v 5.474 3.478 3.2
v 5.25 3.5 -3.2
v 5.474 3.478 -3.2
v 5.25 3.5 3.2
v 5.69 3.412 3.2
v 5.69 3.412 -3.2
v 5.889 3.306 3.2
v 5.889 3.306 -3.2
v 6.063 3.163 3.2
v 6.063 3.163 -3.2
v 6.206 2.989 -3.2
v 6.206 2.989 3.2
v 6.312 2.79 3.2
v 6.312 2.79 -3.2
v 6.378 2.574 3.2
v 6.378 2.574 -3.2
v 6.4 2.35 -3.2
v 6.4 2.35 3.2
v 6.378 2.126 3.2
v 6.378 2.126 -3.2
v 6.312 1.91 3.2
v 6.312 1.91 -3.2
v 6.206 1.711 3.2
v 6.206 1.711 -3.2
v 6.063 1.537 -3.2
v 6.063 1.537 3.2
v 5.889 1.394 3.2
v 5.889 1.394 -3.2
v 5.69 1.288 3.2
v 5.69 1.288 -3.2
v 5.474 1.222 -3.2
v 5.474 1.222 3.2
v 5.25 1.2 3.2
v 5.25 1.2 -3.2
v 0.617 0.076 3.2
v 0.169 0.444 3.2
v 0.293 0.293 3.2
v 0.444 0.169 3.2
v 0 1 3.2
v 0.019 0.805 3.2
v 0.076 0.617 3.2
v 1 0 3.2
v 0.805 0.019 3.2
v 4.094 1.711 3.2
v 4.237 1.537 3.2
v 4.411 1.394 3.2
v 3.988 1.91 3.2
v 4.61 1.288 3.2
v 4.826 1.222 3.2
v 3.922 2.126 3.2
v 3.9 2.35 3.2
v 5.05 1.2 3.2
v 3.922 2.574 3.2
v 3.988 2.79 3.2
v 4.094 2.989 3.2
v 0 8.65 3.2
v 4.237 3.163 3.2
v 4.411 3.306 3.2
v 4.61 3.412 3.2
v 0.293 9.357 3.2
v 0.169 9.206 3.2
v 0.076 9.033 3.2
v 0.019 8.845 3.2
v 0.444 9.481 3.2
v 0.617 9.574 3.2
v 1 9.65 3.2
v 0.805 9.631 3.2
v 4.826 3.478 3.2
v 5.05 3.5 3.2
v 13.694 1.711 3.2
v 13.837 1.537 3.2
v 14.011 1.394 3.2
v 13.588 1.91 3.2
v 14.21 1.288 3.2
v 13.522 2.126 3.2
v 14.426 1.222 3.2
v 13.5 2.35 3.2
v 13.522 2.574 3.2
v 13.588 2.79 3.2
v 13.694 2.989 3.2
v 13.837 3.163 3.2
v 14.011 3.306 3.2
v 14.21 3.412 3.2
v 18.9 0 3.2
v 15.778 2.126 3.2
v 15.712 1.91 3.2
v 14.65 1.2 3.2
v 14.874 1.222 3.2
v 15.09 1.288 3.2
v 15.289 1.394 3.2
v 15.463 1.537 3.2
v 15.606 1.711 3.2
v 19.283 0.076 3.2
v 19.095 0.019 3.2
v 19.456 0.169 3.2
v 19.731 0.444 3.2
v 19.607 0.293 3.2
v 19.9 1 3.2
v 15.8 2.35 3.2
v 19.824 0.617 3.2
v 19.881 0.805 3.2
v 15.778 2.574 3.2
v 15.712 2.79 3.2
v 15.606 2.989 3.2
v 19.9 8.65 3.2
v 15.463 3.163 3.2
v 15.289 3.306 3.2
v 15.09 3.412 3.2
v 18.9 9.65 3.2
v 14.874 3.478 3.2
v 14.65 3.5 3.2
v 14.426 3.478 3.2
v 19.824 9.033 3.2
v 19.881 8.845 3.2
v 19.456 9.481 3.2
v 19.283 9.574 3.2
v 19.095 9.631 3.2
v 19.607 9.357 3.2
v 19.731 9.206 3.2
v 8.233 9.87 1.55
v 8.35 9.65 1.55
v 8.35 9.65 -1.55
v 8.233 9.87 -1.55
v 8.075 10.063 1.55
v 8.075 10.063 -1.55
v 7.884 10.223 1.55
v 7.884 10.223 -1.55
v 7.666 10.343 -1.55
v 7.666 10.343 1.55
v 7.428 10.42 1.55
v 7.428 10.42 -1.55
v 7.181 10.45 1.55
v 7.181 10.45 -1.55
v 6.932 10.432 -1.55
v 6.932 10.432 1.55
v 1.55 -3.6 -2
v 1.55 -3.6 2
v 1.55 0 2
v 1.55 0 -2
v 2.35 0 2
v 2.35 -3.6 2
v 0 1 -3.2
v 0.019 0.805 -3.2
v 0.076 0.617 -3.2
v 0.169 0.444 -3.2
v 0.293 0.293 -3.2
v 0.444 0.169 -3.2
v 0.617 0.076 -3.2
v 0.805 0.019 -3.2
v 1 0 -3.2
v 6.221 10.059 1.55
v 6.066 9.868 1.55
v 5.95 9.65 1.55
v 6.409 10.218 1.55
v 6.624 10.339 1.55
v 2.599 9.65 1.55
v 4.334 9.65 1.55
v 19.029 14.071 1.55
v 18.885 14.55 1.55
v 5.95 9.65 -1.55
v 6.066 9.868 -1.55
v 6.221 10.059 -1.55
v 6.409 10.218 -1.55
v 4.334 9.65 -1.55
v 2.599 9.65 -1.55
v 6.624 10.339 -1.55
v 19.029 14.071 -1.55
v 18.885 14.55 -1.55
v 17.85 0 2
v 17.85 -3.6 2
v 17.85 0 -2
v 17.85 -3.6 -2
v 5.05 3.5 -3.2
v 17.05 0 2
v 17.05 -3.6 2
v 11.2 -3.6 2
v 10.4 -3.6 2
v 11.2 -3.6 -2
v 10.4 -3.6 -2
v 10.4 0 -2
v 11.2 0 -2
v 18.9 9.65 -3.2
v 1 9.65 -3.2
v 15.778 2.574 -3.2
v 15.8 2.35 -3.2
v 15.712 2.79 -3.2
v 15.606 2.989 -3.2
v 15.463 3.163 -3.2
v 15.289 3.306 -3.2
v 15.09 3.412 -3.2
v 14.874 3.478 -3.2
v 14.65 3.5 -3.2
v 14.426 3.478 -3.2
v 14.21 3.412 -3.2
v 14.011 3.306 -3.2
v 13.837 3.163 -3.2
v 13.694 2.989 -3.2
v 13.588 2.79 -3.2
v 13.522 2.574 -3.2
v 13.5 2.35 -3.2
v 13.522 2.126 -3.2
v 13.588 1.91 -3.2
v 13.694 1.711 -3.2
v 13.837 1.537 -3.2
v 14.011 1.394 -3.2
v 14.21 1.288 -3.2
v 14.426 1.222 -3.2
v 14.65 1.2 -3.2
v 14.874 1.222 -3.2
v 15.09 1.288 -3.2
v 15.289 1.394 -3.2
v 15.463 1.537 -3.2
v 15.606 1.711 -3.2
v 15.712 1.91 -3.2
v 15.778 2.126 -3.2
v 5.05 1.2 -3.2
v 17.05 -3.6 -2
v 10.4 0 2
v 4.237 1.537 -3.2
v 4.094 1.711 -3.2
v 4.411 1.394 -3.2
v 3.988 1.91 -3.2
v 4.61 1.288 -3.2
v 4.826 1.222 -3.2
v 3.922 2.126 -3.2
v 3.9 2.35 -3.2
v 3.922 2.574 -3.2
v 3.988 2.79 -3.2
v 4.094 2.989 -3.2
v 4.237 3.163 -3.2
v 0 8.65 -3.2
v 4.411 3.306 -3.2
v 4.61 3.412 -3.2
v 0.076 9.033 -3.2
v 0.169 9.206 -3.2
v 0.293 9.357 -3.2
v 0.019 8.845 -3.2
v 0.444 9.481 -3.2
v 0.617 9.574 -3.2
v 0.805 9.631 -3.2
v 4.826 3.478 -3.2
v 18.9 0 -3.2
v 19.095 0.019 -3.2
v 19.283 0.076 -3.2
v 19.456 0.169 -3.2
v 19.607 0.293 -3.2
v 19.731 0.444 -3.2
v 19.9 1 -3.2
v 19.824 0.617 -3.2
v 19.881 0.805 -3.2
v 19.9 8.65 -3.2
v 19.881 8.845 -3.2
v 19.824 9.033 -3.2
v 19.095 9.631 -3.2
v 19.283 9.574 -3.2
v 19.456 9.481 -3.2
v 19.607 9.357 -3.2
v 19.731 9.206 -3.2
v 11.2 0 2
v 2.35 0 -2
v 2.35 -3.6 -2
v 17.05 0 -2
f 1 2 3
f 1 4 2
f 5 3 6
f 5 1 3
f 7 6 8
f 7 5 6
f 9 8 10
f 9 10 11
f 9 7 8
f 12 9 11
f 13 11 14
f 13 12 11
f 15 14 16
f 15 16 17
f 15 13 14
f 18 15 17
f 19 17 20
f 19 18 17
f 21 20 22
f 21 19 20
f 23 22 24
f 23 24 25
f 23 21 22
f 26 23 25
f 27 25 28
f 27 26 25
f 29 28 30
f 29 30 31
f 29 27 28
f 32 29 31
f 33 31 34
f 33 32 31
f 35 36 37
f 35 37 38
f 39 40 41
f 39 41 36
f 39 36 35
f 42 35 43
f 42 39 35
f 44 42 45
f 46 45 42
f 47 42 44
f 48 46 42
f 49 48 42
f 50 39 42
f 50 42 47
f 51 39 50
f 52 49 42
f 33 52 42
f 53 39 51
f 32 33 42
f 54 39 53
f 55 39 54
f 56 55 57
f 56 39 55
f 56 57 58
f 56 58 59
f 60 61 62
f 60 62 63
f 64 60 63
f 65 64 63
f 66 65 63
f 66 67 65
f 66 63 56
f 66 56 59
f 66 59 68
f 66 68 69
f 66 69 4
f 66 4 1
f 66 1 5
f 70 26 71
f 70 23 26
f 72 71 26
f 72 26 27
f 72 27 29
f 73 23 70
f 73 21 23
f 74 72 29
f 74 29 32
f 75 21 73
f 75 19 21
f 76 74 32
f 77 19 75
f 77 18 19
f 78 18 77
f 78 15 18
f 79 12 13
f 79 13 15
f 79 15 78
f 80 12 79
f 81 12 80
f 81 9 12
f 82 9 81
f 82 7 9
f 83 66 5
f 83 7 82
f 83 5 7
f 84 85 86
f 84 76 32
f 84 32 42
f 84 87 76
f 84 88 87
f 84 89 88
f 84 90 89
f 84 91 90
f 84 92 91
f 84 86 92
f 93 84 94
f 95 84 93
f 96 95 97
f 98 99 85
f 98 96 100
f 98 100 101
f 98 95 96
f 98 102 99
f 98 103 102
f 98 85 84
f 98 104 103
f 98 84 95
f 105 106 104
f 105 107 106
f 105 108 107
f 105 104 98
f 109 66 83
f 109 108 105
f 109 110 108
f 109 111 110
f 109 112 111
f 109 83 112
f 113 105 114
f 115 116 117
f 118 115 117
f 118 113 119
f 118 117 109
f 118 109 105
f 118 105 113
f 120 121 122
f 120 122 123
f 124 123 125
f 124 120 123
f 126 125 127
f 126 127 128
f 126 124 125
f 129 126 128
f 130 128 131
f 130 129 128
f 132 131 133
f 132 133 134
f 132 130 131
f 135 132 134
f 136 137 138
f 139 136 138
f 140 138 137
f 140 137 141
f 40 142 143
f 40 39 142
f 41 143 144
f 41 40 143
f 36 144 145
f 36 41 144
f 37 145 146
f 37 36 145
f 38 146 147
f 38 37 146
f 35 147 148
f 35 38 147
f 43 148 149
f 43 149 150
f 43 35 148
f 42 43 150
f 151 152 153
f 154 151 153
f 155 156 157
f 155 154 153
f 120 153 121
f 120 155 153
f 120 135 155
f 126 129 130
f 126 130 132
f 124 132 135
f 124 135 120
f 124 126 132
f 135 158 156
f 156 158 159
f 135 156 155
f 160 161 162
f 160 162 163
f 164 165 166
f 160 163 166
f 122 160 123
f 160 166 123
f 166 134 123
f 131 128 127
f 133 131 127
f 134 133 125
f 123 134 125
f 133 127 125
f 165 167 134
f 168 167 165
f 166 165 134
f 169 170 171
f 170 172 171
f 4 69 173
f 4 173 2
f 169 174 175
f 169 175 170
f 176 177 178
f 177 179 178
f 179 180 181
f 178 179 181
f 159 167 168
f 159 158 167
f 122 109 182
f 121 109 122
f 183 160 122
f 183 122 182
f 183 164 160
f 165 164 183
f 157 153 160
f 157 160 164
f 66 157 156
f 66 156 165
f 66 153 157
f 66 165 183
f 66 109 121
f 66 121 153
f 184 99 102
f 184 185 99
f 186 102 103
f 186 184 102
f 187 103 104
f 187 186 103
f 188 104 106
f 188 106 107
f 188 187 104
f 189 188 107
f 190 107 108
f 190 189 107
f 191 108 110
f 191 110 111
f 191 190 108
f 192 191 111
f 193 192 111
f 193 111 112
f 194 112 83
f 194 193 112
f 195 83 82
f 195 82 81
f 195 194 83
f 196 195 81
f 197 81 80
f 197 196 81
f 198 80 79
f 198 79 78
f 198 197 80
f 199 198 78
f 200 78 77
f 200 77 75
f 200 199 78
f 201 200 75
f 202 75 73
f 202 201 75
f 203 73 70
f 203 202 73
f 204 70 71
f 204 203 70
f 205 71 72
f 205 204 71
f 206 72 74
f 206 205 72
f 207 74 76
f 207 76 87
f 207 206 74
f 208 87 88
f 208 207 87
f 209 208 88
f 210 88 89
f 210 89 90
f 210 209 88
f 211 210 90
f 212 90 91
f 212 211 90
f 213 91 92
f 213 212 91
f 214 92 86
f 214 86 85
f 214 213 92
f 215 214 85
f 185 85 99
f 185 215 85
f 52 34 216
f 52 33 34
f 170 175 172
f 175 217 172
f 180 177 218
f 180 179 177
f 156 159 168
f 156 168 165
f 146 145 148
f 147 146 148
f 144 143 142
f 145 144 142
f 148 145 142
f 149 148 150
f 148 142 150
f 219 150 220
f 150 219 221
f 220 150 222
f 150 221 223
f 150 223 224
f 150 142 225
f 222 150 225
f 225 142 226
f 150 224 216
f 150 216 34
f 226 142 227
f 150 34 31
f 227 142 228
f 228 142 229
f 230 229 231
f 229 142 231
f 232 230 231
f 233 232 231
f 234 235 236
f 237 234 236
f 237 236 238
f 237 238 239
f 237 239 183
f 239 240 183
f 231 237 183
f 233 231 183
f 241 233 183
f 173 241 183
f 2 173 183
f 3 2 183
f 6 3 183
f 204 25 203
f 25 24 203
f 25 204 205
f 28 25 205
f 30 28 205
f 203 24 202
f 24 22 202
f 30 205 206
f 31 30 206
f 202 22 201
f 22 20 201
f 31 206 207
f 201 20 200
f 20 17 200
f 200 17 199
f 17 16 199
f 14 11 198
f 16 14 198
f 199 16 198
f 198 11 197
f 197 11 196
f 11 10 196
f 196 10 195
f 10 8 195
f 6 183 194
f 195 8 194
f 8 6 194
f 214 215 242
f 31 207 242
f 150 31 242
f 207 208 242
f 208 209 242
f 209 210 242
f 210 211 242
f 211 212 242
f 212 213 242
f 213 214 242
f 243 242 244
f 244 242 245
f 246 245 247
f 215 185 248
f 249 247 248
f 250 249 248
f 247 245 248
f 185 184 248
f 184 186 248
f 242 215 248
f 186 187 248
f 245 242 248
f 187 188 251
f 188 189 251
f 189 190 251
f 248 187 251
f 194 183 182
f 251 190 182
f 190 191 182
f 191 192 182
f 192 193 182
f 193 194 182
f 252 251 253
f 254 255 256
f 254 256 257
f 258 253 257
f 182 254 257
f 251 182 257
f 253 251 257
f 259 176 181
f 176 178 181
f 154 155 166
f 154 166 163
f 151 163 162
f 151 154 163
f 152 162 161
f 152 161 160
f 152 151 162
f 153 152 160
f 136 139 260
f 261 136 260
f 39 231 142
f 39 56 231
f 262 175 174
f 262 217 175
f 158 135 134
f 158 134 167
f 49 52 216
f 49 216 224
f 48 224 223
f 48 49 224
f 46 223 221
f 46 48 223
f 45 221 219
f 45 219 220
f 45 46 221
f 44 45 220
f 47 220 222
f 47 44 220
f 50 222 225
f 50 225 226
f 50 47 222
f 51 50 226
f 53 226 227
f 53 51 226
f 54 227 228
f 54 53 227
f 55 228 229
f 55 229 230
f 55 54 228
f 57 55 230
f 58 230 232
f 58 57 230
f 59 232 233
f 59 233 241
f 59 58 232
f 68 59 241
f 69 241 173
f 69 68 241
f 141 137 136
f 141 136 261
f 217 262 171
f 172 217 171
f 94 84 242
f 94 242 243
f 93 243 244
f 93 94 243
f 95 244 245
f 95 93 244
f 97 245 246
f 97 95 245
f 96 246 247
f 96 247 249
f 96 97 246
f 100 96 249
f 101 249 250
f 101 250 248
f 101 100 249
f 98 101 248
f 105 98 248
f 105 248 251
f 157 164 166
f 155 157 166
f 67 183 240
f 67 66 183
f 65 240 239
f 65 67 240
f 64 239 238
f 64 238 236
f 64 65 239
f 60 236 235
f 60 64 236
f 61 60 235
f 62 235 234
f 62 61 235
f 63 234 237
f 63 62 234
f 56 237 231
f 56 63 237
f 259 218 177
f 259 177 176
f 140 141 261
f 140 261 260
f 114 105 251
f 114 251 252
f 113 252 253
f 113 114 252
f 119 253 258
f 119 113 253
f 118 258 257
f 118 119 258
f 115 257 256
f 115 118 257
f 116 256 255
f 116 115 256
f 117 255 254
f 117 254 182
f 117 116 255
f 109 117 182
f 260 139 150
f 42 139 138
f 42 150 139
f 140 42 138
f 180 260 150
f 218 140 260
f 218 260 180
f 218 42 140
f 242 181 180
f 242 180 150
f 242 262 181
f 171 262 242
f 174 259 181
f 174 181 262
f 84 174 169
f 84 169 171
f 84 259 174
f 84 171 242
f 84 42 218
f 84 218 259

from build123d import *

# Parameters (mm, degrees)
F0_R     = 1.15
F1_DEPTH = 3.2
F3_DEPTH = 1.55
F4_W     = 0.8
F4_H     = 3.6
F5_DEPTH = 2
F7_DEPTH = 1.55


with BuildPart() as f1:
    # F0 (on Top) → F1 (new body, symmetric)
    with BuildSketch(Plane.XY):
        with BuildLine():
            ThreePointArc((0, 1), (0.292893, 0.292893), (1, 0))
            Line((1, 0), (18.9, 0))
            ThreePointArc((18.9, 0), (19.607107, 0.292893), (19.9, 1))
            Line((19.9, 1), (19.9, 8.65))
            ThreePointArc((19.9, 8.65), (19.607107, 9.357107), (18.9, 9.65))
            Line((18.9, 9.65), (1, 9.65))
            ThreePointArc((1, 9.65), (0.292893, 9.357107), (0, 8.65))
            Line((0, 8.65), (0, 1))
        make_face()
        with BuildLine():
            ThreePointArc((5.05, 1.2), (3.9, 2.35), (5.05, 3.5))
            Line((5.05, 3.5), (5.25, 3.5))
            ThreePointArc((5.25, 3.5), (6.4, 2.35), (5.25, 1.2))
            Line((5.25, 1.2), (5.05, 1.2))
        make_face(mode=Mode.SUBTRACT)
        with Locations((14.65, 2.35)):
            Circle(F0_R, mode=Mode.SUBTRACT)
    extrude(amount=F1_DEPTH, both=True)

    # F2 (on Top) → F3 (join, symmetric)
    with BuildSketch(Plane.XY):
        with BuildLine():
            Line((5.95, 9.65), (8.35, 9.65))
            ThreePointArc((8.35, 9.65), (7.15, 10.45), (5.95, 9.65))
        make_face()
    extrude(amount=F3_DEPTH, both=True)

    # F4 (on Top) → F5 (join, symmetric)
    with BuildSketch(Plane.XY):
        with Locations((17.45, -1.8)):
            Rectangle(F4_W, F4_H)
        with Locations((10.8, -1.8)):
            Rectangle(F4_W, F4_H)
        with Locations((1.95, -1.8)):
            Rectangle(F4_W, F4_H)
    extrude(amount=F5_DEPTH, both=True)

    # F6 (on Top) → F7 (join, symmetric)
    with BuildSketch(Plane.XY):
        Polygon((19.028934, 14.071202), (18.884875, 14.55), (1.64816, 9.363898), (1.792219, 8.8851), align=None)
    extrude(amount=F7_DEPTH, both=True)


solid = f1.part
